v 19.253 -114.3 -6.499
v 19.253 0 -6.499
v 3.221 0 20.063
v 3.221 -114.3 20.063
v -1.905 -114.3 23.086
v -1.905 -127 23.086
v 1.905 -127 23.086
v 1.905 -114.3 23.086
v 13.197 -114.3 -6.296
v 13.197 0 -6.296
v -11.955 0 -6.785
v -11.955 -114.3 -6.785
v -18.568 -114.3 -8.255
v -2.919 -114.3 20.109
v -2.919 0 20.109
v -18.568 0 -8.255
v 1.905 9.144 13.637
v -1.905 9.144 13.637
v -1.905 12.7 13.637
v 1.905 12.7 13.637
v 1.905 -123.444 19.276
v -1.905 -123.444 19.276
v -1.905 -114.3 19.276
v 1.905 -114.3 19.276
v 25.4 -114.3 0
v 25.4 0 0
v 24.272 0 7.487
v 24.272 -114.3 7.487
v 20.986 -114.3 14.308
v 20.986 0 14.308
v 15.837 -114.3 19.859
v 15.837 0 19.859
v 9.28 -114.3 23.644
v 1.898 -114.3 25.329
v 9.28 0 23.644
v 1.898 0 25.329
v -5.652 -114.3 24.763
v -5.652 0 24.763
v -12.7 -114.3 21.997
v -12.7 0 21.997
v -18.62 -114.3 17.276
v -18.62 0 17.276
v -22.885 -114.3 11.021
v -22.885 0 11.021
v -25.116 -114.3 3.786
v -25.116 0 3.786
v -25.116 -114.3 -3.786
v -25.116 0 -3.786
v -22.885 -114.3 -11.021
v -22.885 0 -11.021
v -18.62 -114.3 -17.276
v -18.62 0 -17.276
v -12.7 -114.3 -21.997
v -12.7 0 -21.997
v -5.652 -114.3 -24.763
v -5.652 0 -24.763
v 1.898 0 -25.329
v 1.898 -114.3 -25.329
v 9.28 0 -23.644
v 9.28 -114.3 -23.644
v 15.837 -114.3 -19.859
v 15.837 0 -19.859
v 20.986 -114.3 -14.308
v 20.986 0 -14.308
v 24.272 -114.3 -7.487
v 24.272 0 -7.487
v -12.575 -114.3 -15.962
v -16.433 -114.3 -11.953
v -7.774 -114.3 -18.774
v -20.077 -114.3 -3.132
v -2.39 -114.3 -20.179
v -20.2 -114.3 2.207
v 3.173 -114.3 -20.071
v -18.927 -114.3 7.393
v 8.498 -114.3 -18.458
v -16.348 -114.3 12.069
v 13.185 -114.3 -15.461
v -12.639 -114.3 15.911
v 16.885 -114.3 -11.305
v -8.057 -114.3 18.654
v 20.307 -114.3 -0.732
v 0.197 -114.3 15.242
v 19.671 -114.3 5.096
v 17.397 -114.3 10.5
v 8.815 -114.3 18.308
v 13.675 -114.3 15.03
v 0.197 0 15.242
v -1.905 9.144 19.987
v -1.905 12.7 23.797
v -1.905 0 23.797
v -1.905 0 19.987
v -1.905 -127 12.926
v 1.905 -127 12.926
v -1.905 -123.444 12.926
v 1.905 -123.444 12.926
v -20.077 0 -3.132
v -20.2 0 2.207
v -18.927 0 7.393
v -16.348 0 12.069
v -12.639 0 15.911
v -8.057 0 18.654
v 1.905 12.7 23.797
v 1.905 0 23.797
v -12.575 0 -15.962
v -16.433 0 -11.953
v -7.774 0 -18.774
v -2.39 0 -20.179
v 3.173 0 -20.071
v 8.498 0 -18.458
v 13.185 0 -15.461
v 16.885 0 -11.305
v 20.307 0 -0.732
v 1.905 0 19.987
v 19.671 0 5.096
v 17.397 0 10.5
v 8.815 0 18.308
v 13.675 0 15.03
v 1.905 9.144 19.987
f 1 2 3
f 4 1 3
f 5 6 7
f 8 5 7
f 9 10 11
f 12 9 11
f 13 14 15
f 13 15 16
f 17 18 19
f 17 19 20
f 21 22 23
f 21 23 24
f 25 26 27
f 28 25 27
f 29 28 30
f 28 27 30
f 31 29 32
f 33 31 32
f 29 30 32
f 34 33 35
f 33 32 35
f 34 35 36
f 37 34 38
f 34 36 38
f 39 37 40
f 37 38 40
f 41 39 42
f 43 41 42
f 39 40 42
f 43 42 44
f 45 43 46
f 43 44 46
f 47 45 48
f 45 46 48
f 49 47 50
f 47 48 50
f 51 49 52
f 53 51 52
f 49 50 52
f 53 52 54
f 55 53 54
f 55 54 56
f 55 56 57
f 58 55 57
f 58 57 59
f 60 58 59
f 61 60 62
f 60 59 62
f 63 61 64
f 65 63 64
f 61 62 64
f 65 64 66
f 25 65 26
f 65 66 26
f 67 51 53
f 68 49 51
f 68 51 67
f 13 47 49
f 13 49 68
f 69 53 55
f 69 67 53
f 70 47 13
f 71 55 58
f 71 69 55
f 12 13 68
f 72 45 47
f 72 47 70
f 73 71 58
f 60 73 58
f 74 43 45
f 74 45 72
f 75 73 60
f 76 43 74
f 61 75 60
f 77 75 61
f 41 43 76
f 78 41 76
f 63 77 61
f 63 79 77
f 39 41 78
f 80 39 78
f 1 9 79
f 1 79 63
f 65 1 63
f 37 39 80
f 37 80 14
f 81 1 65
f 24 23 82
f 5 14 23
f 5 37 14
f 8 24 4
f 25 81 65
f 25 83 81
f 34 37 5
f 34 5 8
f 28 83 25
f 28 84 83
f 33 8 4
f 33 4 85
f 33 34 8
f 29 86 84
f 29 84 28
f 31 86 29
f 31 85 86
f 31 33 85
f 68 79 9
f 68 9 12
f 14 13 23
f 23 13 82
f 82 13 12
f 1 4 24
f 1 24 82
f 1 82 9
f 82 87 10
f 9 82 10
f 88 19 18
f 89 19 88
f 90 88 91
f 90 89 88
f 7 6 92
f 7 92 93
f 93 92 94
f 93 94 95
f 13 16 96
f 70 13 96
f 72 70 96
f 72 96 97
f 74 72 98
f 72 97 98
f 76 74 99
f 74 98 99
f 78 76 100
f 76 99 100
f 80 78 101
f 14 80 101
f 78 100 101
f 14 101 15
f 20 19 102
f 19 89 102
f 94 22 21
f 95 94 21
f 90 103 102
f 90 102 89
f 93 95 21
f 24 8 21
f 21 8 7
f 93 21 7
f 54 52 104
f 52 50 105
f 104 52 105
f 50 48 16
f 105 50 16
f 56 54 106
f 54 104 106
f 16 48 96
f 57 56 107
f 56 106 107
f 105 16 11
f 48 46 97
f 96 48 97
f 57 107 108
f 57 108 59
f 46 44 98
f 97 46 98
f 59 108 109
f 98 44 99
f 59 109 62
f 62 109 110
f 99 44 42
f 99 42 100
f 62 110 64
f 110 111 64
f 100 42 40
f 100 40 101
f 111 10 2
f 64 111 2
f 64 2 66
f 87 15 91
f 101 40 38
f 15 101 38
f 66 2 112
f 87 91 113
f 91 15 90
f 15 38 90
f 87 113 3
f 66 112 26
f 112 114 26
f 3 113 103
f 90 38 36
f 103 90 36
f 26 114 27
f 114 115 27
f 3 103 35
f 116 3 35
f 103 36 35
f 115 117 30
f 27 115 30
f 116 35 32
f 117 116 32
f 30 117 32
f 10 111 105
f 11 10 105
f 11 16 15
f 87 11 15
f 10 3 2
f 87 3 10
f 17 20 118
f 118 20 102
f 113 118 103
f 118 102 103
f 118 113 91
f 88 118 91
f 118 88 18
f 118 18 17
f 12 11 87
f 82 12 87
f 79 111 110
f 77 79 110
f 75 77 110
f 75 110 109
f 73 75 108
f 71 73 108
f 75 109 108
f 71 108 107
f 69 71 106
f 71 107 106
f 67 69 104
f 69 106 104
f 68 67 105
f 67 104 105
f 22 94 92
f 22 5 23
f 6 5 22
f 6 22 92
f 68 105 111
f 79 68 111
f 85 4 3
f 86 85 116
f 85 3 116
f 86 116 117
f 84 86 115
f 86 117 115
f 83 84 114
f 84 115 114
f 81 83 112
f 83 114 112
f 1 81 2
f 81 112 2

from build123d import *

# Parameters (mm, degrees)
F0_R     = 25.4
F1_DEPTH = 114.3
F2_W     = 3.81
F2_H     = 3.81
F3_DEPTH = 12.7
F4_W     = 3.81
F4_H     = 3.81
F5_DEPTH = 12.7
F6_W     = 3.81
F6_H     = 3.556
F7_DEPTH = 6.35
F8_W     = 3.81
F8_H     = 3.556
F9_DEPTH = 6.35


with BuildPart() as f1:
    # F0 (on Front) → F1 (new body)
    with BuildSketch(Plane.XZ):
        Circle(F0_R)
        with BuildLine():
            ThreePointArc((16.884709, -11.305264), (0.394939, -20.316162), (-16.432577, -11.952941))
            Line((-16.432577, -11.952941), (16.884709, -11.305264))
        make_face(mode=Mode.SUBTRACT)
        with BuildLine():
            ThreePointArc((-18.567839, -8.254559), (-17.791782, 9.816053), (-2.919006, 20.109247))
            Line((-2.919006, 20.109247), (-18.567839, -8.254559))
        make_face(mode=Mode.SUBTRACT)
        Polygon((0.19747, 15.241919), (13.196979, -6.295993), (-11.955155, -6.784942), align=None, mode=Mode.SUBTRACT)
        with BuildLine():
            ThreePointArc((3.221185, 20.06306), (17.396842, 10.500108), (19.252822, -6.498558))
            Line((19.252822, -6.498558), (3.221185, 20.06306))
        make_face(mode=Mode.SUBTRACT)
    extrude(amount=F1_DEPTH)

    # F2 (on face) → F3 (join)
    with BuildSketch(Plane(origin=(0, 0, 0), x_dir=(-1, 0, 0), z_dir=(0, 1, 0))):
        with Locations((0, 21.892242)):
            Rectangle(F2_W, F2_H)
    extrude(amount=F3_DEPTH)

    # F4 (on face) → F5 (join)
    with BuildSketch(Plane.XZ.offset(114.3)):
        with Locations((0, 21.180816)):
            Rectangle(F4_W, F4_H)
    extrude(amount=F5_DEPTH)

    # F6 (on face) → F7 (join)
    with BuildSketch(Plane(origin=(0, 0, 19.987242), x_dir=(1, 0, 0), z_dir=(0, 0, -1))):
        with Locations((0, -10.922)):
            Rectangle(F6_W, F6_H)
    extrude(amount=F7_DEPTH)

    # F8 (on face) → F9 (join)
    with BuildSketch(Plane(origin=(0, 0, 19.275816), x_dir=(1, 0, 0), z_dir=(0, 0, -1))):
        with Locations((0, 125.222)):
            Rectangle(F8_W, F8_H)
    extrude(amount=F9_DEPTH)


solid = f1.part
